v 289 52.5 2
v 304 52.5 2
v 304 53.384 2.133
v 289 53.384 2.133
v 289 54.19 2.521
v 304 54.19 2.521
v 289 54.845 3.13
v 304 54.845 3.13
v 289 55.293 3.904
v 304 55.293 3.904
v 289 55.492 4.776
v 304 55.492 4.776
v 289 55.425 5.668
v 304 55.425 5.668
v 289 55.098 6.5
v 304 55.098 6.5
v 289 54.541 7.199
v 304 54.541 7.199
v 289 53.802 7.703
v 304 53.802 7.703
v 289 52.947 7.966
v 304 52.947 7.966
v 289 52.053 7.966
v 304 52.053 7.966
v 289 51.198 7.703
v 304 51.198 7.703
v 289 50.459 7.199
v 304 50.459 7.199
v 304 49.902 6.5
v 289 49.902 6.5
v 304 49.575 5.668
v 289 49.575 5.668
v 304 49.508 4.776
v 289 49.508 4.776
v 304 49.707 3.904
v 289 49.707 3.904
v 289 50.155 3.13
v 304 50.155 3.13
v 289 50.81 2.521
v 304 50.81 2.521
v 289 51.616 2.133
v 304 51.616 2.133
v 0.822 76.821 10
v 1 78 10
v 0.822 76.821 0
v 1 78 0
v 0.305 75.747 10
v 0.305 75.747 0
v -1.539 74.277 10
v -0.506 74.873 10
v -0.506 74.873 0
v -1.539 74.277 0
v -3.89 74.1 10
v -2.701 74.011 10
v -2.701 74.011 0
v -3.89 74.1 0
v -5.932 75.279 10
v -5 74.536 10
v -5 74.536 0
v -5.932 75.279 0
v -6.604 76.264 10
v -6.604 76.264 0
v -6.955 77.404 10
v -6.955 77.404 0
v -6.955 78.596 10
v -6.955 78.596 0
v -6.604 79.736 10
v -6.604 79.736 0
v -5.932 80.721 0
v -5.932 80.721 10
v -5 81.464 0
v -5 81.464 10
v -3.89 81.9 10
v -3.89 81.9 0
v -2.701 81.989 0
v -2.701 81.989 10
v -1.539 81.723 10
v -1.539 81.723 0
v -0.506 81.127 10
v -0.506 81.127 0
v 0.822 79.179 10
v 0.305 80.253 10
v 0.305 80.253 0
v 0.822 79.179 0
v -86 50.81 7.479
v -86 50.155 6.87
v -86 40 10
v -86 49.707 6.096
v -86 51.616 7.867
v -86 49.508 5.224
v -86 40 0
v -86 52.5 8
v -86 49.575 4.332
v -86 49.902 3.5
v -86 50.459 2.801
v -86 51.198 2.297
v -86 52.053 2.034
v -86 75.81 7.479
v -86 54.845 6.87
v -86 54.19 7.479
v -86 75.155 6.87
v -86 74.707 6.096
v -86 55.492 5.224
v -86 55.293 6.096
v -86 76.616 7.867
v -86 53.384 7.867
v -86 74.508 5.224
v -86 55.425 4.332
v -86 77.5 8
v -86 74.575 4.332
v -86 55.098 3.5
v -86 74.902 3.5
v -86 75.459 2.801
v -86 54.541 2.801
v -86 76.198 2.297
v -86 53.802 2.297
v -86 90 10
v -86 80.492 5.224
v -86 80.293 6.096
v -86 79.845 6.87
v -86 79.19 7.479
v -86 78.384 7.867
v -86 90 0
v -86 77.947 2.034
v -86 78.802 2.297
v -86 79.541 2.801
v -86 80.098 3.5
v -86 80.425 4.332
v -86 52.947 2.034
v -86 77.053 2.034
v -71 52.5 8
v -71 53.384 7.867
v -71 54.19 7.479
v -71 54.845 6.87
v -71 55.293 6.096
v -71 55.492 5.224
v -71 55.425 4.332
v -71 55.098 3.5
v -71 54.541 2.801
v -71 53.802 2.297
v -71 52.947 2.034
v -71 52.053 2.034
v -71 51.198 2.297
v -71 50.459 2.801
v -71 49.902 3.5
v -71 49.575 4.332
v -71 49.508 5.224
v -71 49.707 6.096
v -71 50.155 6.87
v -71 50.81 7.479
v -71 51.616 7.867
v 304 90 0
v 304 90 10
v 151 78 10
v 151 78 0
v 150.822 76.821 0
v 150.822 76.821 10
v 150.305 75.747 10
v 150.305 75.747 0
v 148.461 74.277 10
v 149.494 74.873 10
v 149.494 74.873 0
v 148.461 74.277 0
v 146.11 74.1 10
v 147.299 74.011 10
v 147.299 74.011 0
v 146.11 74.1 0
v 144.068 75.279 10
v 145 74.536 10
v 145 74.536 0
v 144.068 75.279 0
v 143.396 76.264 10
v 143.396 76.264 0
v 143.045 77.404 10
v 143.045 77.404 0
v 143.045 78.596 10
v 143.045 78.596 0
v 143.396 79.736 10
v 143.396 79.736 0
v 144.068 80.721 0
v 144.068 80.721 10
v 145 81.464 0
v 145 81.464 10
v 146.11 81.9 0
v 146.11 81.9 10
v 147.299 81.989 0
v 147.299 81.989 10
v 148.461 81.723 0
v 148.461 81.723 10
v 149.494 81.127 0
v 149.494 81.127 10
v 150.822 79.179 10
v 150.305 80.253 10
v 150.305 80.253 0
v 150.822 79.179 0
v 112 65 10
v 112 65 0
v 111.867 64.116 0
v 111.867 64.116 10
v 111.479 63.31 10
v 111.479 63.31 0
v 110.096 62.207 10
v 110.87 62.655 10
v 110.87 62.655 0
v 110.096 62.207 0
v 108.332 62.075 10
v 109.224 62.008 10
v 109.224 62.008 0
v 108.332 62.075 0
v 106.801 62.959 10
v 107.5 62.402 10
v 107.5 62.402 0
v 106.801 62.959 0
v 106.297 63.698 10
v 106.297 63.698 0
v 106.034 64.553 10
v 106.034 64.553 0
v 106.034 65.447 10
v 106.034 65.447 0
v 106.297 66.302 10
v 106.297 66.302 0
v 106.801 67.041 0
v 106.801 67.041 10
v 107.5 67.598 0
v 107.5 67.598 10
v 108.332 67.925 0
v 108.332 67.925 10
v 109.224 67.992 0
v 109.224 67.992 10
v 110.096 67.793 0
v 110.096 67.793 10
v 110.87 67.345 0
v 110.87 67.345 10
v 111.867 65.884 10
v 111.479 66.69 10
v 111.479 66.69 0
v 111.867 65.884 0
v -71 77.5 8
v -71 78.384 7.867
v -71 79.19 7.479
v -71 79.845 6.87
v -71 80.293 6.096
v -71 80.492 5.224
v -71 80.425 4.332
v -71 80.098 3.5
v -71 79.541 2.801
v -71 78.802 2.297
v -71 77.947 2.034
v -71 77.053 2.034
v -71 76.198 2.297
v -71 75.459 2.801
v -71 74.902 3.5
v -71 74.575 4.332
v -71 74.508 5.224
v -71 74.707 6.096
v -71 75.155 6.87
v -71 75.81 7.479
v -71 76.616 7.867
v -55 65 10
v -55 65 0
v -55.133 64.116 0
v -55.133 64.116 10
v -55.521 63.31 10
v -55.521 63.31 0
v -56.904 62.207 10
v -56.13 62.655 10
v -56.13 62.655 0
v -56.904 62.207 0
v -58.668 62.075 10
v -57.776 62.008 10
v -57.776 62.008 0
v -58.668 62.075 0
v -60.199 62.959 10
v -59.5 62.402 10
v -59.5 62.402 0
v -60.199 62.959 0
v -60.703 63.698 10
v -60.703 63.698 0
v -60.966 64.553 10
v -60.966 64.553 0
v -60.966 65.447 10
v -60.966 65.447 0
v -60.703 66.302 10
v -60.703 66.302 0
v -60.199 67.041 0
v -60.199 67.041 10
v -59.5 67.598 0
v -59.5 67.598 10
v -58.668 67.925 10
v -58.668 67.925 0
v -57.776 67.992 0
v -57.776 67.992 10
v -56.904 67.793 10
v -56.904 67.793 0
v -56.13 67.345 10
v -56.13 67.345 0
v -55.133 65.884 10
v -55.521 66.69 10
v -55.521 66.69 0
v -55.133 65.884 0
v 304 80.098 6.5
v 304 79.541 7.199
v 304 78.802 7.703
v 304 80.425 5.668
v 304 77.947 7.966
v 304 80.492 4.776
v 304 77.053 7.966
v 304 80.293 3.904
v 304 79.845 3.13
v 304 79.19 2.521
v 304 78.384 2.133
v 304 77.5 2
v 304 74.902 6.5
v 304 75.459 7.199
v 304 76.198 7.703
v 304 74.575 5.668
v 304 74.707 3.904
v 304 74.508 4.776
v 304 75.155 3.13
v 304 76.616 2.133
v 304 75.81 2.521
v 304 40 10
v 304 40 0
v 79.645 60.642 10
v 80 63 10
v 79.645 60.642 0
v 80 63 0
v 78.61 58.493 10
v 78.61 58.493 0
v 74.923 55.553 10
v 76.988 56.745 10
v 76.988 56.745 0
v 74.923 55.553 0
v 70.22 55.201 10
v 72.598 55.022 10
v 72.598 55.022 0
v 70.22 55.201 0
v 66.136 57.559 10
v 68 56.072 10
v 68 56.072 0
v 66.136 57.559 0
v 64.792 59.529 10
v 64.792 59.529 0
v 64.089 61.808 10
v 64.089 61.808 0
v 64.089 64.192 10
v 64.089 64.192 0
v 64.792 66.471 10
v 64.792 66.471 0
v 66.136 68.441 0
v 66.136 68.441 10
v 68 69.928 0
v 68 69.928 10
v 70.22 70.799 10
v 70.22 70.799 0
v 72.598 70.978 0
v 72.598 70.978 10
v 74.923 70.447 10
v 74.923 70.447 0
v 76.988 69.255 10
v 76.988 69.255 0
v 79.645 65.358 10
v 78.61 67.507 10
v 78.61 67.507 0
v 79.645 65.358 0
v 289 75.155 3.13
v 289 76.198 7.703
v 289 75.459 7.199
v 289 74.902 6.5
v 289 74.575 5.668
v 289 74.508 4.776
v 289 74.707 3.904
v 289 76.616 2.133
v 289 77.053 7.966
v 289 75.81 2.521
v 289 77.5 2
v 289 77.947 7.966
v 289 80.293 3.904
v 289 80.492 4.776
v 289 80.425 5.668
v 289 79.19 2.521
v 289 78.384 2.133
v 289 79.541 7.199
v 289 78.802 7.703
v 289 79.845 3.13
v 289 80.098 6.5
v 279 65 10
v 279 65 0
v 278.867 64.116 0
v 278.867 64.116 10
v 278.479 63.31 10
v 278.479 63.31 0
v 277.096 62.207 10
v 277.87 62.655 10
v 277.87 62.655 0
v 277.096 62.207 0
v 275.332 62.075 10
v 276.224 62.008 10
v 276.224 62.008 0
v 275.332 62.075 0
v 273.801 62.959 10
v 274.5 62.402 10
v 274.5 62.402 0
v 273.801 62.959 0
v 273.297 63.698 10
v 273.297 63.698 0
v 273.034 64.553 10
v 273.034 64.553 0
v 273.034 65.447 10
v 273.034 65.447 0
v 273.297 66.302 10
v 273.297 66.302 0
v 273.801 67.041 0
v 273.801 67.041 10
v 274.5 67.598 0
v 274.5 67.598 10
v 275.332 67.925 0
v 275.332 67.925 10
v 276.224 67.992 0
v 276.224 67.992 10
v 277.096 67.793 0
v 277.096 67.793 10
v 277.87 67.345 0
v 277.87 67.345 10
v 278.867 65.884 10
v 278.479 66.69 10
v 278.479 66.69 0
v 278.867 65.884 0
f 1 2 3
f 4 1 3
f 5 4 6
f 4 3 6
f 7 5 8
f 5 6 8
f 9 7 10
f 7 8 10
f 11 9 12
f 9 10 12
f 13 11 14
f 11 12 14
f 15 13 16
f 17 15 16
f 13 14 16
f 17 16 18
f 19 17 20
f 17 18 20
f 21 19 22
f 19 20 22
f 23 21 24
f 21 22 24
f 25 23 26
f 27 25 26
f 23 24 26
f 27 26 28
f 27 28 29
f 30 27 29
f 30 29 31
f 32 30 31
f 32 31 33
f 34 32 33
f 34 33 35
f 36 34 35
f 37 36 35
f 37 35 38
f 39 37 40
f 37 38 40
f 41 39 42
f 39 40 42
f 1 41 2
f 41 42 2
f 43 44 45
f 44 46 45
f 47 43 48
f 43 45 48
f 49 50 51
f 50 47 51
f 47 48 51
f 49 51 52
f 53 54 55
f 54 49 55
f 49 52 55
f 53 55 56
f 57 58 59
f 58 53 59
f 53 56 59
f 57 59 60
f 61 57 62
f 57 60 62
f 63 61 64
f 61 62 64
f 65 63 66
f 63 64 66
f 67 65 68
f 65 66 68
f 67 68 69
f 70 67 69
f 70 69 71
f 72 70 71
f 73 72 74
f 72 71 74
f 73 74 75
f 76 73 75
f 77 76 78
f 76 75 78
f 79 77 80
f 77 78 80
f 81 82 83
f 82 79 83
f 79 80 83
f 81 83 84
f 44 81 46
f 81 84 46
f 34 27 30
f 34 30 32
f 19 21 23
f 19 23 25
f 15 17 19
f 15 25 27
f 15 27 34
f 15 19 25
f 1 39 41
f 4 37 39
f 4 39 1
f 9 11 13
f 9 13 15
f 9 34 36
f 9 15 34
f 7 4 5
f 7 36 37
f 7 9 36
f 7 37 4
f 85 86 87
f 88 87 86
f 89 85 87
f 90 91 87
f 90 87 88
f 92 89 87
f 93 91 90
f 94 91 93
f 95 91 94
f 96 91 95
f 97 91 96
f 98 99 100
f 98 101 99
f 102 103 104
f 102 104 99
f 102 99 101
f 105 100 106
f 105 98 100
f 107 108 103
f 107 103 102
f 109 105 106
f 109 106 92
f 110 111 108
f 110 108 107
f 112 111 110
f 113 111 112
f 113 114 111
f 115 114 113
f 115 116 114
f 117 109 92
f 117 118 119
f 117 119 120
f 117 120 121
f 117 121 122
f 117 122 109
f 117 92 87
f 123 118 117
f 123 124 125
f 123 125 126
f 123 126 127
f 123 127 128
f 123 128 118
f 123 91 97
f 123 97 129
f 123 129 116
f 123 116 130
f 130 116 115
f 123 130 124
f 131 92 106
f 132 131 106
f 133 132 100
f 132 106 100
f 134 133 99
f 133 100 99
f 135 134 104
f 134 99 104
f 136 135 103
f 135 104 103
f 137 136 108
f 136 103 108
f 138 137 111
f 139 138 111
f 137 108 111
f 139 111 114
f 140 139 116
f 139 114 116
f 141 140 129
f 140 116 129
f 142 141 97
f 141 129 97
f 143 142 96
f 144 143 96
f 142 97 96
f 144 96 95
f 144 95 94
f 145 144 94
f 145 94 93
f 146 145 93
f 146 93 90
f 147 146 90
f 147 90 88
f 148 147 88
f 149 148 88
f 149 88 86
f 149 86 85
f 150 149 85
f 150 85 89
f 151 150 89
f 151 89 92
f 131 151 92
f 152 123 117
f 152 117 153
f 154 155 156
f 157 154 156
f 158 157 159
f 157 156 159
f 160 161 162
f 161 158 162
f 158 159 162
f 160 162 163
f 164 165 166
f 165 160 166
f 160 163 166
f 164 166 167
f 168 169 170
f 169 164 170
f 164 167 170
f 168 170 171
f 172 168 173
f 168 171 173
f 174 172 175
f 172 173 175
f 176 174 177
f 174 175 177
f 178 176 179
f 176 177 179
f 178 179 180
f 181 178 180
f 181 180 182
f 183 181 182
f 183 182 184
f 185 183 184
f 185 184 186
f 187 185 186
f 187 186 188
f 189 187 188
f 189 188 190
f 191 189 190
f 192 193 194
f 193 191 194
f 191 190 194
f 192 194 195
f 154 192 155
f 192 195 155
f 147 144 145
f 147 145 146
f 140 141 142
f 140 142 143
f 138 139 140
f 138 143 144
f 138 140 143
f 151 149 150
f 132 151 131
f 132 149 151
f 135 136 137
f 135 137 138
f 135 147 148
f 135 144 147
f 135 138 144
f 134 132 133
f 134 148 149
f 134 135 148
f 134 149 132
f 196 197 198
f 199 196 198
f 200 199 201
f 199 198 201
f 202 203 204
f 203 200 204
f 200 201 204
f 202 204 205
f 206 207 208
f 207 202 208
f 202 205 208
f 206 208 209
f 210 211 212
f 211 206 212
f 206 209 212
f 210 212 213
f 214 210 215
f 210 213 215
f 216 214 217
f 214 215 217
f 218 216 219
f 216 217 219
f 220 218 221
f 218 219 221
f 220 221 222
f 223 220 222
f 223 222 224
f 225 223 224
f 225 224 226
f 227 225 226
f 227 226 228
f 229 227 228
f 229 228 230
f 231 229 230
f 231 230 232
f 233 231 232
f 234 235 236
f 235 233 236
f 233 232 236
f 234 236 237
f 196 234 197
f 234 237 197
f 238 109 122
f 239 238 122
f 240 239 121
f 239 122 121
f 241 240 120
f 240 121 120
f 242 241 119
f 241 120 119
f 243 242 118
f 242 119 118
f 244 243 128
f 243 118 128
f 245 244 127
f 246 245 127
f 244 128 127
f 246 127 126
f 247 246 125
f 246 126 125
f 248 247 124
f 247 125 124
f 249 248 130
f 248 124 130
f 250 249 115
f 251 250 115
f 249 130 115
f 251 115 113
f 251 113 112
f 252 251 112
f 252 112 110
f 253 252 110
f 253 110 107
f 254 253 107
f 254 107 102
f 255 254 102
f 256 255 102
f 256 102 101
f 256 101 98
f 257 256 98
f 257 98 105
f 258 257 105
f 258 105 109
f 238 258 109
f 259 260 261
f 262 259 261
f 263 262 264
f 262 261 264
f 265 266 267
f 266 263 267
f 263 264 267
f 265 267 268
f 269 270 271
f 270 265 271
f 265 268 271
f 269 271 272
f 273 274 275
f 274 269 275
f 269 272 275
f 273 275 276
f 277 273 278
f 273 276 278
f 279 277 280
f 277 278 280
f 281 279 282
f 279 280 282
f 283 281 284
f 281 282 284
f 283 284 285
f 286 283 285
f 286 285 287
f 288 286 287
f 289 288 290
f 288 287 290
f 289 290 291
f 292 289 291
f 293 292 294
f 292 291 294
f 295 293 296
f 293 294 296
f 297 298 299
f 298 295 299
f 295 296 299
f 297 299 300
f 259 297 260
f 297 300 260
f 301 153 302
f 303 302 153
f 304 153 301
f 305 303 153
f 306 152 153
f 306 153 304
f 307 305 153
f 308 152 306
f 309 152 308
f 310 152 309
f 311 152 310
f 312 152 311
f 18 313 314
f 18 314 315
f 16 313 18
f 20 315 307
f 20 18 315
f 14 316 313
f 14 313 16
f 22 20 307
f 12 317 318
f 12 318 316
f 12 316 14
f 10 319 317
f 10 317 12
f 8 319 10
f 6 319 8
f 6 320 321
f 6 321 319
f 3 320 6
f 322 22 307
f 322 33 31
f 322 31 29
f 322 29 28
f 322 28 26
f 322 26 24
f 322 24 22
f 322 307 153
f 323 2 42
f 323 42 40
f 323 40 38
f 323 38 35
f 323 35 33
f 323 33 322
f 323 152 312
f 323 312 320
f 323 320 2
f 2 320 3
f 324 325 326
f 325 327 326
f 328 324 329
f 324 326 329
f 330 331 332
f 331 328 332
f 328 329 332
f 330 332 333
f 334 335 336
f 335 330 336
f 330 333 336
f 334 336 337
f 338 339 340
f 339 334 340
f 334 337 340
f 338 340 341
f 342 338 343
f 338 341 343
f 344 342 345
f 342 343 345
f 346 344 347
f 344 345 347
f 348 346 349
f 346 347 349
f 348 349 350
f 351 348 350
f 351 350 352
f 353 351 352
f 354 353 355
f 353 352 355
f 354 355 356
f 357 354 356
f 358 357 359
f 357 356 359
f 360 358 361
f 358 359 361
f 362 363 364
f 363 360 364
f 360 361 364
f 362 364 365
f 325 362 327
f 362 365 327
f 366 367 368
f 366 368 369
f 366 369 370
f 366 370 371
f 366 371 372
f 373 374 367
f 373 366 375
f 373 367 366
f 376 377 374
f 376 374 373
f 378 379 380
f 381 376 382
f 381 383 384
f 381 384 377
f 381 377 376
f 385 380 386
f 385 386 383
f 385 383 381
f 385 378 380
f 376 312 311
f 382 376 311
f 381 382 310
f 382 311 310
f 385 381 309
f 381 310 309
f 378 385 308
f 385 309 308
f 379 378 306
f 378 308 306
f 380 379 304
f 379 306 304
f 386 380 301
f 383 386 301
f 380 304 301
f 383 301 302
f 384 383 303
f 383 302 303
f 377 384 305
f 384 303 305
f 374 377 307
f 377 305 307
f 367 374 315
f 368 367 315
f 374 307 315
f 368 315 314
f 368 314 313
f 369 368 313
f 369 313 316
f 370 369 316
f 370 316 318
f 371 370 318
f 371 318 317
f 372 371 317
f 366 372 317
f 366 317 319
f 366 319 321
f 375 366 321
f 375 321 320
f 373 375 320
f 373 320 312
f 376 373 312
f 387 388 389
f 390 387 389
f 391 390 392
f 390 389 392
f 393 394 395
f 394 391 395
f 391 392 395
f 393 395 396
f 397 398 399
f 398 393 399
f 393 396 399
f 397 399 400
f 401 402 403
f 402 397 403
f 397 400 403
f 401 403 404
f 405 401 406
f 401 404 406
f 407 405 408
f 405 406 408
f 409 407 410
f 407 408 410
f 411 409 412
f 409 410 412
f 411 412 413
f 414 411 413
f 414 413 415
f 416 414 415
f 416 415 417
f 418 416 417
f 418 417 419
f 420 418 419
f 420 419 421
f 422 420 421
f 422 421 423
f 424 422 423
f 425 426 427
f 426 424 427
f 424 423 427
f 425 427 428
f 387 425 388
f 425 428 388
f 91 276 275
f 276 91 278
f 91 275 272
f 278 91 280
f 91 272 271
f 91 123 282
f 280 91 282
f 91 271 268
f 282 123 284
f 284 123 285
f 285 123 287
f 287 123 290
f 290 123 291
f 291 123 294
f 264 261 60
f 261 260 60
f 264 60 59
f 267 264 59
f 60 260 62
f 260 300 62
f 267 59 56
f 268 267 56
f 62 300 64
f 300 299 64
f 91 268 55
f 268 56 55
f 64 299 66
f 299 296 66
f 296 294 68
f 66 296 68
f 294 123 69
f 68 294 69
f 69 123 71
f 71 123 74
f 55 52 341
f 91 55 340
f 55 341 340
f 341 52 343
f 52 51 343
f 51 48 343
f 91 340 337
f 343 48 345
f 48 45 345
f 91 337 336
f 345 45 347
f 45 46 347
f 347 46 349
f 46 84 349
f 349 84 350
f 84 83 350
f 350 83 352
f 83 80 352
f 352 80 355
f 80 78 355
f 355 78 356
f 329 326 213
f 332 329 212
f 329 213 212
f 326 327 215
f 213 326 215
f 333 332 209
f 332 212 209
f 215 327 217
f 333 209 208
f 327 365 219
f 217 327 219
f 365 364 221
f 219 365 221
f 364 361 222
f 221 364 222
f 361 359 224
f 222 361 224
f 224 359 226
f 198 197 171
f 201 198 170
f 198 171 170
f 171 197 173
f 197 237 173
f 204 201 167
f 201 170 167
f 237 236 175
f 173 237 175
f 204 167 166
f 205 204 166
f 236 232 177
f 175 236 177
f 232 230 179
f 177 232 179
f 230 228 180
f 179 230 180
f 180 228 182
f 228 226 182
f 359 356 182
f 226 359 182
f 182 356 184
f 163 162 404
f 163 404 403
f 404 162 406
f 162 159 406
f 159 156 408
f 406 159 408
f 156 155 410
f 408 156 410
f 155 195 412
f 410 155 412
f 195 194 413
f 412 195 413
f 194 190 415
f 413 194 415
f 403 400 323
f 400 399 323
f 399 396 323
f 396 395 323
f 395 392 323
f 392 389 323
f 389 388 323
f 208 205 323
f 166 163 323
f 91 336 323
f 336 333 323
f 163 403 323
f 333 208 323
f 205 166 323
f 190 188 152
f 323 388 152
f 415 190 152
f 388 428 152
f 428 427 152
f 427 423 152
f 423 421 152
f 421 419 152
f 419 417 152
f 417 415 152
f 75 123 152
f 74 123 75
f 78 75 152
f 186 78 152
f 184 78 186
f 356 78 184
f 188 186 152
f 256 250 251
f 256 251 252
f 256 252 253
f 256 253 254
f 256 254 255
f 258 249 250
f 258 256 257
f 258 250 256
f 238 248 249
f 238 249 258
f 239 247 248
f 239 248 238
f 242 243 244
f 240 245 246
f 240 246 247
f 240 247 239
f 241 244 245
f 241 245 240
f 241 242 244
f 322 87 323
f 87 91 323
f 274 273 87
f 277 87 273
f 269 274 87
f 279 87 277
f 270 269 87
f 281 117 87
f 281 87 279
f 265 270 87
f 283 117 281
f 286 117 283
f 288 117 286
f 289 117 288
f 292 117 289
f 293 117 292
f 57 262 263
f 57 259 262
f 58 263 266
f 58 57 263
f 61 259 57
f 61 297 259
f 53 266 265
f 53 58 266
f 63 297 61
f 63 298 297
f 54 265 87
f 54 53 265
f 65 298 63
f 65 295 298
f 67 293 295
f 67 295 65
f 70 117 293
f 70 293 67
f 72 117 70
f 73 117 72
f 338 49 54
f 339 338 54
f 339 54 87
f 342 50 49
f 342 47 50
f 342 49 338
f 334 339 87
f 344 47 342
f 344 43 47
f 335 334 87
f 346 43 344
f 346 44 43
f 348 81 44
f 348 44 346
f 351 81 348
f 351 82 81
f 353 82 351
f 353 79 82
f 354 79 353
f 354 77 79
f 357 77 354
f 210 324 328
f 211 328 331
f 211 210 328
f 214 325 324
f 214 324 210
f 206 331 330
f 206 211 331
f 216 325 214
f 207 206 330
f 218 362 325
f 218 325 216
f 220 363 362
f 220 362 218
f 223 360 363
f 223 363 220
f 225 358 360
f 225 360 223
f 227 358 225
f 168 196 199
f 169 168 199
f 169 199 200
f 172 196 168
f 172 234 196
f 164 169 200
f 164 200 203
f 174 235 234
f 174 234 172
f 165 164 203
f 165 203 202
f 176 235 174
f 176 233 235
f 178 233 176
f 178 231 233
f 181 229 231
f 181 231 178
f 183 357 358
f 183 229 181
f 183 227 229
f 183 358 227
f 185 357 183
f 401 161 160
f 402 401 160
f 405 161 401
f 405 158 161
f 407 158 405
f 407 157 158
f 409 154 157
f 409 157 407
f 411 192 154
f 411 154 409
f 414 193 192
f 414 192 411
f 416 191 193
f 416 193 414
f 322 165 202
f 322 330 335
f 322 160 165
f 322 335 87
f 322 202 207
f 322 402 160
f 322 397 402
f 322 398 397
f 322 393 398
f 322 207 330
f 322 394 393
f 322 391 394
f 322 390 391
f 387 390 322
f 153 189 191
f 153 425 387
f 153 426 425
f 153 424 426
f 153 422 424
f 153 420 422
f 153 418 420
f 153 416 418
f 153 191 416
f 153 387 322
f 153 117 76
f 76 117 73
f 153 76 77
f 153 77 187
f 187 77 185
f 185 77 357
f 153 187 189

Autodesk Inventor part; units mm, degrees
ref_plane "YZ Plane" through (0, 0, 0) normal (1, 0, 0) x (0, 1, 0)
ref_plane "XZ Plane" through (0, 0, 0) normal (0, 1, 0) x (-1, 0, 0)
ref_plane "XY Plane" through (0, 0, 0) normal (0, 0, 1) x (1, 0, 0)
sketch "Sketch1" plane through (0, 0, 0) normal (0, 0, 1) x (1, 0, 0)
  line L0 (-86, 40) -> (-86, 90)
  line L1 (-86, 90) -> (304, 90)
  line L2 (304, 90) -> (304, 40)
  circle A0 centre (72, 63) radius 8
  circle A1 centre (147, 78) radius 4
  circle A2 centre (-3, 78) radius 4
  line L3 (-86, 40) -> (304, 40)
  circle A3 centre (-58, 65) radius 3
  circle A4 centre (276, 65) radius 3
  circle A5 centre (109, 65) radius 3
  dimension "d1" = 390
  dimension "d2" = 16
  dimension "d6" = 8
  dimension "d7" = 8
  dimension "d8" = 15
  dimension "d13" = 75
  dimension "d14" = 75
  dimension "d27" = 15
  dimension "d38" = 50
  dimension "d58" = 27
  dimension "d68" = 232
  dimension "d69" = 6
  dimension "d70" = 25
  dimension "d71" = 28
  dimension "d72" = 6
  dimension "d73" = 25
  dimension "d74" = 28
  dimension "d75" = 6
  dimension "d76" = 25
  dimension "d77" = 195
extrude "Extrusión3" add sketch "Sketch1" along normal blind 10
sketch "Boceto3" plane through (304, 40, 0) normal (1, 0, 0) x (0, 0, -1)
  line L0 (-10, 0) -> (-10, 50) projected
  line L1 (-10, 50) -> (-5, 50)
  line L2 (0, 50) -> (-10, 50) projected
  line L3 (0, 0) -> (0, 50) projected
  line L4 (-5, 0) -> (-5, 12.5)
  line L5 (-5, 50) -> (-5, 37.5)
  circle A0 centre (-5, 37.5) radius 3
  circle A1 centre (-5, 12.5) radius 3
  point P0 (0, -40)
  dimension "d42" = 5
  dimension "d43" = 50
  dimension "d44" = 12.5
  dimension "d45" = 12.5
  dimension "d46" = 6
  dimension "d47" = 6
extrude "Extrusión4" cut sketch "Boceto3" against normal blind 15
sketch "Boceto4" plane through (-86, 40, 0) normal (-1, 0, 0) x (0, 0, 1)
  line L0 (10, 0) -> (10, 50) projected
  line L1 (10, 50) -> (5, 50)
  line L2 (0, 50) -> (10, 50) projected
  line L3 (5, 50) -> (5, 0)
  line L4 (5, 0) -> (5, 12.5)
  line L5 (5, 50) -> (5, 37.5)
  circle A0 centre (5, 12.5) radius 3
  circle A1 centre (5, 37.5) radius 3
  point P0 (0, -40)
  dimension "d50" = 5
  dimension "d51" = 50
  dimension "d52" = 12.5
  dimension "d53" = 12.5
extrude "Extrusión5" cut sketch "Boceto4" against normal blind 15
thread "Rosca1" size "M6x1" class "6H" standard "ISO Metric profile" length 430
thread "Rosca2" size "M6x1" class "6H" standard "ISO Metric profile" length 430
thread "Rosca3" size "M6x1" class "6H" standard "ISO Metric profile" length 430
thread "Rosca4" size "M6x1" class "6H" standard "ISO Metric profile" length 430
thread "Rosca5" size "M6x1" class "6H" standard "ISO Metric profile" length 100
thread "Rosca6" size "M6x1" class "6H" standard "ISO Metric profile" length 100
thread "Rosca7" size "M6x1" class "6H" standard "ISO Metric profile" length 100
equation "\"d73\" = d70"
equation "\"d74\" = d71"
equation "\"d76\" = d70"
properties part number "Frente" material "Aluminio 6061"
